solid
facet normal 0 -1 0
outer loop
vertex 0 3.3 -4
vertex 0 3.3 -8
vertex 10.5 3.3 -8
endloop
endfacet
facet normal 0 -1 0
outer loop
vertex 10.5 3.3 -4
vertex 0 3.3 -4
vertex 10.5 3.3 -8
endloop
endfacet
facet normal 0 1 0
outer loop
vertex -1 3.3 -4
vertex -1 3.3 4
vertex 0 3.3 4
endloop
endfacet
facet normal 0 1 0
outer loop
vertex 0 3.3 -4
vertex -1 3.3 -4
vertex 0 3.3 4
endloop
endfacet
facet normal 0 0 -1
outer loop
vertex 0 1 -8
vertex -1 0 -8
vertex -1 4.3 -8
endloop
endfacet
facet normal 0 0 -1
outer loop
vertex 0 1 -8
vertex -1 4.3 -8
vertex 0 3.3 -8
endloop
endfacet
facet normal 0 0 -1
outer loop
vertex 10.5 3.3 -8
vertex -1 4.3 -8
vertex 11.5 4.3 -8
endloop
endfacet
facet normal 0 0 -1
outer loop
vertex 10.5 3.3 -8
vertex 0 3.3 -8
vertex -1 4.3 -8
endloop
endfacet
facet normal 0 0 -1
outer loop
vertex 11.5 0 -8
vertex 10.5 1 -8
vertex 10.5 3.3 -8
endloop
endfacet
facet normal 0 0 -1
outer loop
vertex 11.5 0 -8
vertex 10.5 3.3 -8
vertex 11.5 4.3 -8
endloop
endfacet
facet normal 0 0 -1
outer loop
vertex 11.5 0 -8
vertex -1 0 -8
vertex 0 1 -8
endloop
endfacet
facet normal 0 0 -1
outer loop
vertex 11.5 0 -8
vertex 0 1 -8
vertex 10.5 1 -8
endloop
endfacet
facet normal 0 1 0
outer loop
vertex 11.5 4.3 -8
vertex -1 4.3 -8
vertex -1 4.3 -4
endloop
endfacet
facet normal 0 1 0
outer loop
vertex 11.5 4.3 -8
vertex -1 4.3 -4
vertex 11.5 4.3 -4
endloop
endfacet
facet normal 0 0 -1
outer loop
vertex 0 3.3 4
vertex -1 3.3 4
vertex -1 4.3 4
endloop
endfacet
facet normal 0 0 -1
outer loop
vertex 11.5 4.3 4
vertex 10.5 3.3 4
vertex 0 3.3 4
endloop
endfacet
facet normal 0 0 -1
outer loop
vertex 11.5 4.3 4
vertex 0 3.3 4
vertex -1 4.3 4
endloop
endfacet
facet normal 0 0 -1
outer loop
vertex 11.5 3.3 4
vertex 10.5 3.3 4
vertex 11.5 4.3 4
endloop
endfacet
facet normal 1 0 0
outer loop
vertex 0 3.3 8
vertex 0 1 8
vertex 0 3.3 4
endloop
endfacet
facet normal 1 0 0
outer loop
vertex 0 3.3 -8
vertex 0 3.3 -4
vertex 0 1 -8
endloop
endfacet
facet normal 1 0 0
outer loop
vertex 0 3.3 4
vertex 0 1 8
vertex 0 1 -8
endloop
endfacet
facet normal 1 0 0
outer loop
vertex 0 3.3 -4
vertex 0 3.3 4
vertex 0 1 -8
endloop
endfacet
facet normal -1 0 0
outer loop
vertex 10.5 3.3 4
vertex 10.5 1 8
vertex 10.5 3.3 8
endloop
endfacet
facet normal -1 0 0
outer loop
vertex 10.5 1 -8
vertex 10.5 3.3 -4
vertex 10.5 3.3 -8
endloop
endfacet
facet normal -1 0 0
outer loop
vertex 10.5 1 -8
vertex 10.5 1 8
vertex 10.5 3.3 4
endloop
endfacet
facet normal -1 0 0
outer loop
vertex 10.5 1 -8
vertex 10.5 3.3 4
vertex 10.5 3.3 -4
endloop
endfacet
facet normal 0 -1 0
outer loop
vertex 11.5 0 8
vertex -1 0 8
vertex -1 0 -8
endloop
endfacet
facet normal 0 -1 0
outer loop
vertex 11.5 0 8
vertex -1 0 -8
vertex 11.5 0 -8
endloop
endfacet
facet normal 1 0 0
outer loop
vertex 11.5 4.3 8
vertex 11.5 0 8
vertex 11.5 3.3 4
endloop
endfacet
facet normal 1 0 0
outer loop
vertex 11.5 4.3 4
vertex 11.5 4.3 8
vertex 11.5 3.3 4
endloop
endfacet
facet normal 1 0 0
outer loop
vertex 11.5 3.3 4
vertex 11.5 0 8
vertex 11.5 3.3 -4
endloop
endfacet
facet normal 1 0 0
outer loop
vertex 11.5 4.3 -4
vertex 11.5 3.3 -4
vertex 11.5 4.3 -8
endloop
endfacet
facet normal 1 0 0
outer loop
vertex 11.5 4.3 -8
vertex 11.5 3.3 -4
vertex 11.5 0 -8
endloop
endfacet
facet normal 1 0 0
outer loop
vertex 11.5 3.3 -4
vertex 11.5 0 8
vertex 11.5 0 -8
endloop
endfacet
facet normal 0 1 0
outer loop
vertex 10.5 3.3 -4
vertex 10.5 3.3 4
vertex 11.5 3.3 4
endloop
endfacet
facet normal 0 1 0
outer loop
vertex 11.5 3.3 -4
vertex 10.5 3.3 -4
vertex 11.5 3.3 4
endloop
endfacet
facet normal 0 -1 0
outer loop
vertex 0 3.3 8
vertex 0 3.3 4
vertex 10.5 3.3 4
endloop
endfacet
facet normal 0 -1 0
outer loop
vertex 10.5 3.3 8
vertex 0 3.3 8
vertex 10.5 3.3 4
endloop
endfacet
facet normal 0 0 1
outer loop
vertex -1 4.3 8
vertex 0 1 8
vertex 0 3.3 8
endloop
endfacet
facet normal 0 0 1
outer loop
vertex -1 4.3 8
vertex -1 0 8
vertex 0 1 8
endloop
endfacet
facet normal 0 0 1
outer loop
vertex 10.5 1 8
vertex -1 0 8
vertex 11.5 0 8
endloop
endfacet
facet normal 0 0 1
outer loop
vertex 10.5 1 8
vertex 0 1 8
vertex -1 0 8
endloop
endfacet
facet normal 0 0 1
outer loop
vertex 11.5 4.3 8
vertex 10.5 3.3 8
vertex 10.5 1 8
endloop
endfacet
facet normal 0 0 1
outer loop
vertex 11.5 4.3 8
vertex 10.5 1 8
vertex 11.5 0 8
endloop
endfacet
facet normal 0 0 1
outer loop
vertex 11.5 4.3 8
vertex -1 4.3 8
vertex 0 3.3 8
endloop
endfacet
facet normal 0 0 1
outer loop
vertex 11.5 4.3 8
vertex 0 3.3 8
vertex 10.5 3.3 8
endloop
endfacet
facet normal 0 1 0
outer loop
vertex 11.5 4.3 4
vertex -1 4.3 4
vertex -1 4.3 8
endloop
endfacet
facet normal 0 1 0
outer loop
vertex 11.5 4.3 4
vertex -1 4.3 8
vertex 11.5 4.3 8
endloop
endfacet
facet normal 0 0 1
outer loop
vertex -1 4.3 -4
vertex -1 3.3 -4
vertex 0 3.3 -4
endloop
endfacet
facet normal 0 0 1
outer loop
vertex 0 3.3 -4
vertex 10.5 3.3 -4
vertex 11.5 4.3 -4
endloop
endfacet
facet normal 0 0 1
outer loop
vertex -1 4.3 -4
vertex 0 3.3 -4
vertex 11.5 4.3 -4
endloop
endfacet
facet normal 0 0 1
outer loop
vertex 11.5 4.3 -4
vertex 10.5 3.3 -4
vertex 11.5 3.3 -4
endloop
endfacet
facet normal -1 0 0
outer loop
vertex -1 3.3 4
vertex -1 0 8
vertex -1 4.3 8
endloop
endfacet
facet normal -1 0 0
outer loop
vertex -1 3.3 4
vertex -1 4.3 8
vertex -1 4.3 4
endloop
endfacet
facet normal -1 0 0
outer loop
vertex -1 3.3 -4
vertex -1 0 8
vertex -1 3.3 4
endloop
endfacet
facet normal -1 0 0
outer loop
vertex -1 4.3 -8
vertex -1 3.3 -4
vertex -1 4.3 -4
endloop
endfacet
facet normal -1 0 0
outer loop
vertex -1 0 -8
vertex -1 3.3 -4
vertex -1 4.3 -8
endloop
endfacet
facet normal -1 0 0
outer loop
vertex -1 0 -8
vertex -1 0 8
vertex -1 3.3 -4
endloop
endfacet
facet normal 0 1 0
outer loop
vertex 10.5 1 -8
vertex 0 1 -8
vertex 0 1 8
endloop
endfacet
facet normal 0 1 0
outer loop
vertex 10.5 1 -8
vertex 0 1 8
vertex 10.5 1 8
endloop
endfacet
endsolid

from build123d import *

# Parameters (mm, degrees)
SKETCH_2_W           = 10.5
SKETCH_2_H           = 4
EXTRUDE_1_DEPTH      = 1
SKETCH_3_W           = 1
SKETCH_3_H           = 16
EXTRUDE_2_DEPTH      = 2.3
EXTRUDE_2_DEPTH_BACK = 1
SKETCH_4_W           = 12.5
SKETCH_4_H           = 4
EXTRUDE_3_DEPTH      = 1


with BuildPart() as part:
    # 草图2 → 凸台-拉伸1 (new body)
    with BuildSketch(Plane(origin=(0, 0, 0), x_dir=(1, 0, 0), z_dir=(0, 1, 0))):
        with Locations((5.25, 6)):
            Rectangle(SKETCH_2_W, SKETCH_2_H)
        with Locations((5.25, 2)):
            Rectangle(SKETCH_2_W, SKETCH_2_H)
        with Locations((5.25, -2)):
            Rectangle(SKETCH_2_W, SKETCH_2_H)
        with Locations((5.25, -6)):
            Rectangle(SKETCH_2_W, SKETCH_2_H)
    extrude(amount=EXTRUDE_1_DEPTH)

    # 草图3 → 凸台-拉伸2 (add, two sides)
    with BuildSketch(Plane(origin=(0, 1, 0), x_dir=(1, 0, 0), z_dir=(0, 1, 0))) as extrude_2_sk:
        with Locations((11, 0)):
            Rectangle(SKETCH_3_W, SKETCH_3_H)
        with Locations((-0.5, 0)):
            Rectangle(SKETCH_3_W, SKETCH_3_H)
    extrude(amount=EXTRUDE_2_DEPTH)
    extrude(extrude_2_sk.sketch, amount=-EXTRUDE_2_DEPTH_BACK)

    # 草图4 → 凸台-拉伸3 (add)
    with BuildSketch(Plane(origin=(0, 3.3, 0), x_dir=(1, 0, 0), z_dir=(0, 1, 0))):
        with Locations((5.25, 6)):
            Rectangle(SKETCH_4_W, SKETCH_4_H)
        with Locations((5.25, -6)):
            Rectangle(SKETCH_4_W, SKETCH_4_H)
    extrude(amount=EXTRUDE_3_DEPTH)


solid = part.part
